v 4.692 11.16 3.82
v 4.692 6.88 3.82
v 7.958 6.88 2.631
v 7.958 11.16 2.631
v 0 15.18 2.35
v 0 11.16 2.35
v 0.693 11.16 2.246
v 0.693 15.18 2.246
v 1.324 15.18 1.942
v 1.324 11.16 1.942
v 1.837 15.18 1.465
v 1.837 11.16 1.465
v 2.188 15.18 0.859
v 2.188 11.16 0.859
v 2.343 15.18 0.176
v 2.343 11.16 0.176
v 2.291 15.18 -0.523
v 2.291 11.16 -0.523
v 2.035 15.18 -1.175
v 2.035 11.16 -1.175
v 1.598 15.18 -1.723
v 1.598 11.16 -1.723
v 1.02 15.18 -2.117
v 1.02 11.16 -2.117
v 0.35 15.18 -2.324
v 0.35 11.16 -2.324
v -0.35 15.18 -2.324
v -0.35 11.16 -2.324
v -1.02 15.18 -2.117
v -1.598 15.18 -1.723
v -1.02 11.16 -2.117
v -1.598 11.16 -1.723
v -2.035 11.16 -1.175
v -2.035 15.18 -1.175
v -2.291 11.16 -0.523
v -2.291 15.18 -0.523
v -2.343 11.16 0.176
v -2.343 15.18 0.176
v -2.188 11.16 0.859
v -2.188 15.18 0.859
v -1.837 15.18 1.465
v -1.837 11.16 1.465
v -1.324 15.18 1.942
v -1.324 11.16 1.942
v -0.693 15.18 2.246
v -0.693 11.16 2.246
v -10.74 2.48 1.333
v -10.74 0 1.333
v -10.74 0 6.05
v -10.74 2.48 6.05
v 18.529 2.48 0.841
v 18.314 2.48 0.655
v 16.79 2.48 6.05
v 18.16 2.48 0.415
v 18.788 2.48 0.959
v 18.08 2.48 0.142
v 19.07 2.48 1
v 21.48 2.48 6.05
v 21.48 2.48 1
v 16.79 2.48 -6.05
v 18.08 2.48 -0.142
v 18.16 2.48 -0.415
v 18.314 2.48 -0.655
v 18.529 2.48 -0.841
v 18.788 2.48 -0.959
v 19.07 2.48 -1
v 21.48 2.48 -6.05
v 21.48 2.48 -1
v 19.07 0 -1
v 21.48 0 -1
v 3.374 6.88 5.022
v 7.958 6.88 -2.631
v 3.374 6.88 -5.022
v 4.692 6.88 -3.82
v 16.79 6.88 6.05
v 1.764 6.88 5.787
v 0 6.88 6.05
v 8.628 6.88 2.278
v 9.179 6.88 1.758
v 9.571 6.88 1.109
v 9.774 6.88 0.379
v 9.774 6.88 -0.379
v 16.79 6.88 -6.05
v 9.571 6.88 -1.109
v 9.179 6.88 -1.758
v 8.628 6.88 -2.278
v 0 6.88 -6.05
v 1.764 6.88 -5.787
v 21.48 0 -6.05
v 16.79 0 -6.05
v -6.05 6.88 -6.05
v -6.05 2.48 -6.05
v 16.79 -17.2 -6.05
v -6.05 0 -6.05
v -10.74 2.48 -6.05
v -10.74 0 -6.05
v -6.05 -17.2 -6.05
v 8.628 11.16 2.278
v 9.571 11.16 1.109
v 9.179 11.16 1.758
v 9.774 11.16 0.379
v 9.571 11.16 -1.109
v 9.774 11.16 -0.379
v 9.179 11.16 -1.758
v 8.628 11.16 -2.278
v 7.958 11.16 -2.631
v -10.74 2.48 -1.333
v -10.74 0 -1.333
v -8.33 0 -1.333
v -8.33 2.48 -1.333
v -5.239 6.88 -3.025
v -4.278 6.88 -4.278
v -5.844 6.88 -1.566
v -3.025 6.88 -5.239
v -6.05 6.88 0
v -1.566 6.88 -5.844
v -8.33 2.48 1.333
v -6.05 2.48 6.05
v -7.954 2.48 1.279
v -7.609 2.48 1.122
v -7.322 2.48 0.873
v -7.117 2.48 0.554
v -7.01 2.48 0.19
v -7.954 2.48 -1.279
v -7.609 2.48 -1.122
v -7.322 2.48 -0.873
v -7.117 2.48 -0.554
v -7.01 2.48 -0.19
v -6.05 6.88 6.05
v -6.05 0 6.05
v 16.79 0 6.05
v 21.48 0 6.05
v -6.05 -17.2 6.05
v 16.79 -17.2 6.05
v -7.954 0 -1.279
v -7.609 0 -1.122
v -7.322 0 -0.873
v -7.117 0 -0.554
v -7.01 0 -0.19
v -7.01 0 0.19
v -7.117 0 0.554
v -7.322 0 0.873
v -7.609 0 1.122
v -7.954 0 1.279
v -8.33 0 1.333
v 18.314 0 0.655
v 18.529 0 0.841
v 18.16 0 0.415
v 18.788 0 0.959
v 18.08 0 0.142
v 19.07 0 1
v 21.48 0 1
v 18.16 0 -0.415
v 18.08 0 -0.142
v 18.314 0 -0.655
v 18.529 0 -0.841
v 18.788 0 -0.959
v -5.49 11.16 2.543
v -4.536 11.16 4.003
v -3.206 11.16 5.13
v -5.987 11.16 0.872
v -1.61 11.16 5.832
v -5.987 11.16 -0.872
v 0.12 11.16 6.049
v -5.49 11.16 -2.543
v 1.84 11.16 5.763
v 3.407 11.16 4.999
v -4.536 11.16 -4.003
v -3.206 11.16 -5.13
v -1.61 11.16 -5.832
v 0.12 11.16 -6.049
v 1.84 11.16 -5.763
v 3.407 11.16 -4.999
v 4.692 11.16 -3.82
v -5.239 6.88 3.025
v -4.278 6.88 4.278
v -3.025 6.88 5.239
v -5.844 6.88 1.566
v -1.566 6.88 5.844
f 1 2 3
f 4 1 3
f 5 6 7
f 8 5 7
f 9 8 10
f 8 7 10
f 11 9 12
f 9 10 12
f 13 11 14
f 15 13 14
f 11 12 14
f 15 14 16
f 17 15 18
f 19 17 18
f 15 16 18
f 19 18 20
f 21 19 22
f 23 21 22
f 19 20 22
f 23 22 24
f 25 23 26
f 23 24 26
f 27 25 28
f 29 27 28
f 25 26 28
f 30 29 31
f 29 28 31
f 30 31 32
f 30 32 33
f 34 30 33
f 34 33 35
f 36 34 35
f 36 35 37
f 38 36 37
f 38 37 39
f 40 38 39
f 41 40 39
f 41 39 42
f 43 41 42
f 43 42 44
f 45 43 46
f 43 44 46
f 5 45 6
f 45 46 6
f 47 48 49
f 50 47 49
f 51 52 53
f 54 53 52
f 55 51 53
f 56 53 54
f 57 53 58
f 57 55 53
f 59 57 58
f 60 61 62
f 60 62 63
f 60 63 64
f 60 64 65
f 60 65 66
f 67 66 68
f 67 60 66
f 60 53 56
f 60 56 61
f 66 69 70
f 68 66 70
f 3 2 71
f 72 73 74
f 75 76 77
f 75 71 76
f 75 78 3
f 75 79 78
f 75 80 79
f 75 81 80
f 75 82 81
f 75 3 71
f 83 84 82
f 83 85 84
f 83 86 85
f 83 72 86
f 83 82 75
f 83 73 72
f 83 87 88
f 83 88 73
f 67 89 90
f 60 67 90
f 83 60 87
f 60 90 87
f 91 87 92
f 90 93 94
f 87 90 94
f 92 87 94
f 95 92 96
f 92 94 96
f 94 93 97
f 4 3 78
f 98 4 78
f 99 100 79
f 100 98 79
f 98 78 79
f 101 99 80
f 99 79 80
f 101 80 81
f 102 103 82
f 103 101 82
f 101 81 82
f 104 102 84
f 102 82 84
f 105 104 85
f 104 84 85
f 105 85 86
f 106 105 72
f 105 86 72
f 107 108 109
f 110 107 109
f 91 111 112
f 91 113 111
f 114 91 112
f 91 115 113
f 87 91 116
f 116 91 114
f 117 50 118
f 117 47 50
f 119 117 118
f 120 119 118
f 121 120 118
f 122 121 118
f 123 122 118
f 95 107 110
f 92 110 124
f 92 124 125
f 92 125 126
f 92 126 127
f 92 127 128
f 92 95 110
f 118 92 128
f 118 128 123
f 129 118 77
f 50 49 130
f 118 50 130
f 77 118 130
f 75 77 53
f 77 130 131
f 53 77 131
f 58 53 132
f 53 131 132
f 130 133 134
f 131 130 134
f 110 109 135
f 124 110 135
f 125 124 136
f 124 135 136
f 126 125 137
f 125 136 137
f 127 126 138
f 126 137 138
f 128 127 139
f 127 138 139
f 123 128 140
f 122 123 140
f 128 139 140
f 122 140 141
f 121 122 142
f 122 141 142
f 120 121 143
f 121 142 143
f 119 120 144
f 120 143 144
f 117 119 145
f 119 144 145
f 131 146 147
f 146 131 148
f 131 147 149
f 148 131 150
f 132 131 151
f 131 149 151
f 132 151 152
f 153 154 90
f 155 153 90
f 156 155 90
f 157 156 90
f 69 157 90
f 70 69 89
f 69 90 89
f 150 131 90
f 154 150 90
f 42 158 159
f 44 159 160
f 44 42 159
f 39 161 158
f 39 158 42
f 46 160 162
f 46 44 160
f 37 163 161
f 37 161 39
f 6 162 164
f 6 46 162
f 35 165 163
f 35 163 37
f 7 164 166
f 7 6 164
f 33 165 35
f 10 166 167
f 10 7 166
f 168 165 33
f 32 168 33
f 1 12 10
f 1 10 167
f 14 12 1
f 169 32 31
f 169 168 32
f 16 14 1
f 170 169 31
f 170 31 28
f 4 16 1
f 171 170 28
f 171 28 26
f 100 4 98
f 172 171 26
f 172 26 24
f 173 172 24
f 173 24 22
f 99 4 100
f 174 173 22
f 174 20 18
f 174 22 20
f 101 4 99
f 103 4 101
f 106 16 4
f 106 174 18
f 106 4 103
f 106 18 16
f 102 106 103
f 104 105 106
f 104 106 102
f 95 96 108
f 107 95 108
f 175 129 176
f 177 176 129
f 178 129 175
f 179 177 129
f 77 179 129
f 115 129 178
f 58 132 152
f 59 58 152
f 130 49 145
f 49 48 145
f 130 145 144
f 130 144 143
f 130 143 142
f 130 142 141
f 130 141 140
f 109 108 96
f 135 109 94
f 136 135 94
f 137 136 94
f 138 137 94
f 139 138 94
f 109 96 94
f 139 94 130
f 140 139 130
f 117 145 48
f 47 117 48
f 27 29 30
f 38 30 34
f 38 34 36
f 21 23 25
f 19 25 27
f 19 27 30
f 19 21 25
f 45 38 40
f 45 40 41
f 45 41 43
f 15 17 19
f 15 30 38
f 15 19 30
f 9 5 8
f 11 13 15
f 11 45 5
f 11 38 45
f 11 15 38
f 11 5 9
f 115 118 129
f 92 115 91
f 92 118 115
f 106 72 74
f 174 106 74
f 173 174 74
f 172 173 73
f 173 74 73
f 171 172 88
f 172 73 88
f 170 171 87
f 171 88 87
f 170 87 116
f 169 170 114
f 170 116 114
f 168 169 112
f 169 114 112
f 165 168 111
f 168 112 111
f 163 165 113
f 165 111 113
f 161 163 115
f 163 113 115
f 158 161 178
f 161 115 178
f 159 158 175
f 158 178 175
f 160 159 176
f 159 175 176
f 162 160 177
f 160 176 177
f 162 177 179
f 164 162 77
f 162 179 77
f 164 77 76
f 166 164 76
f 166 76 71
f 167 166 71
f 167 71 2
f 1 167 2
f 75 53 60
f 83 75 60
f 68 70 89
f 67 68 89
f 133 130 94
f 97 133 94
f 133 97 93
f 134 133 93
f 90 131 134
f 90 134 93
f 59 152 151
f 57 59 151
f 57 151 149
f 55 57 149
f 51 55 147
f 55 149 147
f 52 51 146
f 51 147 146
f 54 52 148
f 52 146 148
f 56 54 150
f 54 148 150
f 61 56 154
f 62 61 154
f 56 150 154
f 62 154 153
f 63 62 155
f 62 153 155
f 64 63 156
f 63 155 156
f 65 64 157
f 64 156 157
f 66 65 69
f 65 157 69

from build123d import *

# Parameters (mm, degrees)
SKETCH1_W           = 22.84
SKETCH1_H           = 12.1
BOSS_EXTRUDE1_DEPTH = 17.2
BOSS_EXTRUDE2_DEPTH = 2.48
BOSS_EXTRUDE3_START = 2.48
SKETCH1_4_W         = 22.84
SKETCH1_4_H         = 12.1
BOSS_EXTRUDE3_DEPTH = 4.4
BOSS_EXTRUDE4_START = 6.88
SKETCH1_5_R         = 2.8
SKETCH1_5_R_2       = 6.05
SKETCH1_5_R_3       = 2.35
BOSS_EXTRUDE4_DEPTH = 4.28
BOSS_EXTRUDE5_START = 11.16
SKETCH1_6_R         = 2.35
BOSS_EXTRUDE5_DEPTH = 4.02


with BuildPart() as part:
    # Sketch1 → Boss-Extrude1 (new body)
    with BuildSketch(Plane(origin=(0, 0, 0), x_dir=(1, 0, 0), z_dir=(0, 1, 0))):
        with Locations((5.37, 0)):
            Rectangle(SKETCH1_W, SKETCH1_H)
    extrude(amount=-BOSS_EXTRUDE1_DEPTH)

    # Sketch1<3> → Boss-Extrude2 (add)
    with BuildSketch(Plane(origin=(0, 0, 0), x_dir=(1, 0, 0), z_dir=(0, 1, 0))):
        with BuildLine():
            Line((21.48, -6.05), (21.48, -1))
            Line((21.48, -1), (19.07, -1))
            ThreePointArc((19.07, -1), (18.07, 0), (19.07, 1))
            Line((19.07, 1), (21.48, 1))
            Line((21.48, 1), (21.48, 6.05))
            Line((21.48, 6.05), (-10.74, 6.05))
            Line((-10.74, 6.05), (-10.74, 1.33332999))
            Line((-10.74, 1.33332999), (-8.33, 1.33332999))
            ThreePointArc((-8.33, 1.33332999), (-6.99667001, 0), (-8.33, -1.33332999))
            Line((-8.33, -1.33332999), (-10.74, -1.33332999))
            Line((-10.74, -1.33332999), (-10.74, -6.05))
            Line((-10.74, -6.05), (21.48, -6.05))
        make_face()
    extrude(amount=BOSS_EXTRUDE2_DEPTH)

    # Sketch1<4> → Boss-Extrude3 (add)
    with BuildSketch(Plane(origin=(0, 0, 0), x_dir=(1, 0, 0), z_dir=(0, 1, 0)).offset(BOSS_EXTRUDE3_START)):
        with Locations((5.37, 0)):
            Rectangle(SKETCH1_4_W, SKETCH1_4_H)
    extrude(amount=BOSS_EXTRUDE3_DEPTH)

    # Sketch1<5> → Boss-Extrude4 (add)
    # profile 1 of 9: a face of its own
    with BuildSketch(Plane(origin=(0, 0, 0), x_dir=(1, 0, 0), z_dir=(0, 1, 0)).offset(BOSS_EXTRUDE4_START)):
        with Locations((7, 0)):
            Circle(SKETCH1_5_R)
    # profile 2 of 9: a face of its own
    with BuildSketch(Plane(origin=(0, 0, 0), x_dir=(1, 0, 0), z_dir=(0, 1, 0)).offset(BOSS_EXTRUDE4_START)):
        Circle(SKETCH1_5_R_2)
        Circle(SKETCH1_5_R_3, mode=Mode.SUBTRACT)
    # profile 3 of 9: a face of its own
    with BuildSketch(Plane(origin=(0, 0, 0), x_dir=(1, 0, 0), z_dir=(0, 1, 0)).offset(BOSS_EXTRUDE4_START)):
        with BuildLine():
            Line((4.691578101, -3.819894622), (7.957656401, -2.631139338))
            ThreePointArc((7.957656401, -2.631139338), (6.72964006, -2.786916845), (5.554464286, -2.398004691))
            ThreePointArc((5.554464286, -2.398004691), (5.172116481, -3.138743556), (4.691578101, -3.819894622))
        make_face()
    # profile 4 of 9: a face of its own
    with BuildSketch(Plane(origin=(0, 0, 0), x_dir=(1, 0, 0), z_dir=(0, 1, 0)).offset(BOSS_EXTRUDE4_START)):
        with BuildLine():
            ThreePointArc((5.554464286, 2.398004691), (6.72964006, 2.786916845), (7.957656401, 2.631139338))
            Line((7.957656401, 2.631139338), (4.691578101, 3.819894622))
            ThreePointArc((4.691578101, 3.819894622), (5.172116481, 3.138743556), (5.554464286, 2.398004691))
        make_face()
    # profile 5 of 9: a face of its own
    with BuildSketch(Plane(origin=(0, 0, 0), x_dir=(1, 0, 0), z_dir=(0, 1, 0)).offset(BOSS_EXTRUDE4_START)):
        Circle(SKETCH1_5_R_2)
    # profile 6 of 9: a face of its own
    with BuildSketch(Plane(origin=(0, 0, 0), x_dir=(1, 0, 0), z_dir=(0, 1, 0)).offset(BOSS_EXTRUDE4_START)):
        with Locations((7, 0)):
            Circle(SKETCH1_5_R)
    # profile 7 of 9: a face of its own
    with BuildSketch(Plane(origin=(0, 0, 0), x_dir=(1, 0, 0), z_dir=(0, 1, 0)).offset(BOSS_EXTRUDE4_START)):
        with Locations((7, 0)):
            Circle(SKETCH1_5_R)
    # profile 8 of 9: a face of its own
    with BuildSketch(Plane(origin=(0, 0, 0), x_dir=(1, 0, 0), z_dir=(0, 1, 0)).offset(BOSS_EXTRUDE4_START)):
        Circle(SKETCH1_5_R_2)
    # profile 9 of 9: a face of its own
    with BuildSketch(Plane(origin=(0, 0, 0), x_dir=(1, 0, 0), z_dir=(0, 1, 0)).offset(BOSS_EXTRUDE4_START)):
        Circle(SKETCH1_5_R_3)
    extrude(amount=BOSS_EXTRUDE4_DEPTH)

    # Sketch1<6> → Boss-Extrude5 (add)
    with BuildSketch(Plane(origin=(0, 0, 0), x_dir=(1, 0, 0), z_dir=(0, 1, 0)).offset(BOSS_EXTRUDE5_START)):
        with Locations(Location((0, 0, 0), (0, 0, 270))):
            Circle(SKETCH1_6_R)
    extrude(amount=BOSS_EXTRUDE5_DEPTH)


solid = part.part
